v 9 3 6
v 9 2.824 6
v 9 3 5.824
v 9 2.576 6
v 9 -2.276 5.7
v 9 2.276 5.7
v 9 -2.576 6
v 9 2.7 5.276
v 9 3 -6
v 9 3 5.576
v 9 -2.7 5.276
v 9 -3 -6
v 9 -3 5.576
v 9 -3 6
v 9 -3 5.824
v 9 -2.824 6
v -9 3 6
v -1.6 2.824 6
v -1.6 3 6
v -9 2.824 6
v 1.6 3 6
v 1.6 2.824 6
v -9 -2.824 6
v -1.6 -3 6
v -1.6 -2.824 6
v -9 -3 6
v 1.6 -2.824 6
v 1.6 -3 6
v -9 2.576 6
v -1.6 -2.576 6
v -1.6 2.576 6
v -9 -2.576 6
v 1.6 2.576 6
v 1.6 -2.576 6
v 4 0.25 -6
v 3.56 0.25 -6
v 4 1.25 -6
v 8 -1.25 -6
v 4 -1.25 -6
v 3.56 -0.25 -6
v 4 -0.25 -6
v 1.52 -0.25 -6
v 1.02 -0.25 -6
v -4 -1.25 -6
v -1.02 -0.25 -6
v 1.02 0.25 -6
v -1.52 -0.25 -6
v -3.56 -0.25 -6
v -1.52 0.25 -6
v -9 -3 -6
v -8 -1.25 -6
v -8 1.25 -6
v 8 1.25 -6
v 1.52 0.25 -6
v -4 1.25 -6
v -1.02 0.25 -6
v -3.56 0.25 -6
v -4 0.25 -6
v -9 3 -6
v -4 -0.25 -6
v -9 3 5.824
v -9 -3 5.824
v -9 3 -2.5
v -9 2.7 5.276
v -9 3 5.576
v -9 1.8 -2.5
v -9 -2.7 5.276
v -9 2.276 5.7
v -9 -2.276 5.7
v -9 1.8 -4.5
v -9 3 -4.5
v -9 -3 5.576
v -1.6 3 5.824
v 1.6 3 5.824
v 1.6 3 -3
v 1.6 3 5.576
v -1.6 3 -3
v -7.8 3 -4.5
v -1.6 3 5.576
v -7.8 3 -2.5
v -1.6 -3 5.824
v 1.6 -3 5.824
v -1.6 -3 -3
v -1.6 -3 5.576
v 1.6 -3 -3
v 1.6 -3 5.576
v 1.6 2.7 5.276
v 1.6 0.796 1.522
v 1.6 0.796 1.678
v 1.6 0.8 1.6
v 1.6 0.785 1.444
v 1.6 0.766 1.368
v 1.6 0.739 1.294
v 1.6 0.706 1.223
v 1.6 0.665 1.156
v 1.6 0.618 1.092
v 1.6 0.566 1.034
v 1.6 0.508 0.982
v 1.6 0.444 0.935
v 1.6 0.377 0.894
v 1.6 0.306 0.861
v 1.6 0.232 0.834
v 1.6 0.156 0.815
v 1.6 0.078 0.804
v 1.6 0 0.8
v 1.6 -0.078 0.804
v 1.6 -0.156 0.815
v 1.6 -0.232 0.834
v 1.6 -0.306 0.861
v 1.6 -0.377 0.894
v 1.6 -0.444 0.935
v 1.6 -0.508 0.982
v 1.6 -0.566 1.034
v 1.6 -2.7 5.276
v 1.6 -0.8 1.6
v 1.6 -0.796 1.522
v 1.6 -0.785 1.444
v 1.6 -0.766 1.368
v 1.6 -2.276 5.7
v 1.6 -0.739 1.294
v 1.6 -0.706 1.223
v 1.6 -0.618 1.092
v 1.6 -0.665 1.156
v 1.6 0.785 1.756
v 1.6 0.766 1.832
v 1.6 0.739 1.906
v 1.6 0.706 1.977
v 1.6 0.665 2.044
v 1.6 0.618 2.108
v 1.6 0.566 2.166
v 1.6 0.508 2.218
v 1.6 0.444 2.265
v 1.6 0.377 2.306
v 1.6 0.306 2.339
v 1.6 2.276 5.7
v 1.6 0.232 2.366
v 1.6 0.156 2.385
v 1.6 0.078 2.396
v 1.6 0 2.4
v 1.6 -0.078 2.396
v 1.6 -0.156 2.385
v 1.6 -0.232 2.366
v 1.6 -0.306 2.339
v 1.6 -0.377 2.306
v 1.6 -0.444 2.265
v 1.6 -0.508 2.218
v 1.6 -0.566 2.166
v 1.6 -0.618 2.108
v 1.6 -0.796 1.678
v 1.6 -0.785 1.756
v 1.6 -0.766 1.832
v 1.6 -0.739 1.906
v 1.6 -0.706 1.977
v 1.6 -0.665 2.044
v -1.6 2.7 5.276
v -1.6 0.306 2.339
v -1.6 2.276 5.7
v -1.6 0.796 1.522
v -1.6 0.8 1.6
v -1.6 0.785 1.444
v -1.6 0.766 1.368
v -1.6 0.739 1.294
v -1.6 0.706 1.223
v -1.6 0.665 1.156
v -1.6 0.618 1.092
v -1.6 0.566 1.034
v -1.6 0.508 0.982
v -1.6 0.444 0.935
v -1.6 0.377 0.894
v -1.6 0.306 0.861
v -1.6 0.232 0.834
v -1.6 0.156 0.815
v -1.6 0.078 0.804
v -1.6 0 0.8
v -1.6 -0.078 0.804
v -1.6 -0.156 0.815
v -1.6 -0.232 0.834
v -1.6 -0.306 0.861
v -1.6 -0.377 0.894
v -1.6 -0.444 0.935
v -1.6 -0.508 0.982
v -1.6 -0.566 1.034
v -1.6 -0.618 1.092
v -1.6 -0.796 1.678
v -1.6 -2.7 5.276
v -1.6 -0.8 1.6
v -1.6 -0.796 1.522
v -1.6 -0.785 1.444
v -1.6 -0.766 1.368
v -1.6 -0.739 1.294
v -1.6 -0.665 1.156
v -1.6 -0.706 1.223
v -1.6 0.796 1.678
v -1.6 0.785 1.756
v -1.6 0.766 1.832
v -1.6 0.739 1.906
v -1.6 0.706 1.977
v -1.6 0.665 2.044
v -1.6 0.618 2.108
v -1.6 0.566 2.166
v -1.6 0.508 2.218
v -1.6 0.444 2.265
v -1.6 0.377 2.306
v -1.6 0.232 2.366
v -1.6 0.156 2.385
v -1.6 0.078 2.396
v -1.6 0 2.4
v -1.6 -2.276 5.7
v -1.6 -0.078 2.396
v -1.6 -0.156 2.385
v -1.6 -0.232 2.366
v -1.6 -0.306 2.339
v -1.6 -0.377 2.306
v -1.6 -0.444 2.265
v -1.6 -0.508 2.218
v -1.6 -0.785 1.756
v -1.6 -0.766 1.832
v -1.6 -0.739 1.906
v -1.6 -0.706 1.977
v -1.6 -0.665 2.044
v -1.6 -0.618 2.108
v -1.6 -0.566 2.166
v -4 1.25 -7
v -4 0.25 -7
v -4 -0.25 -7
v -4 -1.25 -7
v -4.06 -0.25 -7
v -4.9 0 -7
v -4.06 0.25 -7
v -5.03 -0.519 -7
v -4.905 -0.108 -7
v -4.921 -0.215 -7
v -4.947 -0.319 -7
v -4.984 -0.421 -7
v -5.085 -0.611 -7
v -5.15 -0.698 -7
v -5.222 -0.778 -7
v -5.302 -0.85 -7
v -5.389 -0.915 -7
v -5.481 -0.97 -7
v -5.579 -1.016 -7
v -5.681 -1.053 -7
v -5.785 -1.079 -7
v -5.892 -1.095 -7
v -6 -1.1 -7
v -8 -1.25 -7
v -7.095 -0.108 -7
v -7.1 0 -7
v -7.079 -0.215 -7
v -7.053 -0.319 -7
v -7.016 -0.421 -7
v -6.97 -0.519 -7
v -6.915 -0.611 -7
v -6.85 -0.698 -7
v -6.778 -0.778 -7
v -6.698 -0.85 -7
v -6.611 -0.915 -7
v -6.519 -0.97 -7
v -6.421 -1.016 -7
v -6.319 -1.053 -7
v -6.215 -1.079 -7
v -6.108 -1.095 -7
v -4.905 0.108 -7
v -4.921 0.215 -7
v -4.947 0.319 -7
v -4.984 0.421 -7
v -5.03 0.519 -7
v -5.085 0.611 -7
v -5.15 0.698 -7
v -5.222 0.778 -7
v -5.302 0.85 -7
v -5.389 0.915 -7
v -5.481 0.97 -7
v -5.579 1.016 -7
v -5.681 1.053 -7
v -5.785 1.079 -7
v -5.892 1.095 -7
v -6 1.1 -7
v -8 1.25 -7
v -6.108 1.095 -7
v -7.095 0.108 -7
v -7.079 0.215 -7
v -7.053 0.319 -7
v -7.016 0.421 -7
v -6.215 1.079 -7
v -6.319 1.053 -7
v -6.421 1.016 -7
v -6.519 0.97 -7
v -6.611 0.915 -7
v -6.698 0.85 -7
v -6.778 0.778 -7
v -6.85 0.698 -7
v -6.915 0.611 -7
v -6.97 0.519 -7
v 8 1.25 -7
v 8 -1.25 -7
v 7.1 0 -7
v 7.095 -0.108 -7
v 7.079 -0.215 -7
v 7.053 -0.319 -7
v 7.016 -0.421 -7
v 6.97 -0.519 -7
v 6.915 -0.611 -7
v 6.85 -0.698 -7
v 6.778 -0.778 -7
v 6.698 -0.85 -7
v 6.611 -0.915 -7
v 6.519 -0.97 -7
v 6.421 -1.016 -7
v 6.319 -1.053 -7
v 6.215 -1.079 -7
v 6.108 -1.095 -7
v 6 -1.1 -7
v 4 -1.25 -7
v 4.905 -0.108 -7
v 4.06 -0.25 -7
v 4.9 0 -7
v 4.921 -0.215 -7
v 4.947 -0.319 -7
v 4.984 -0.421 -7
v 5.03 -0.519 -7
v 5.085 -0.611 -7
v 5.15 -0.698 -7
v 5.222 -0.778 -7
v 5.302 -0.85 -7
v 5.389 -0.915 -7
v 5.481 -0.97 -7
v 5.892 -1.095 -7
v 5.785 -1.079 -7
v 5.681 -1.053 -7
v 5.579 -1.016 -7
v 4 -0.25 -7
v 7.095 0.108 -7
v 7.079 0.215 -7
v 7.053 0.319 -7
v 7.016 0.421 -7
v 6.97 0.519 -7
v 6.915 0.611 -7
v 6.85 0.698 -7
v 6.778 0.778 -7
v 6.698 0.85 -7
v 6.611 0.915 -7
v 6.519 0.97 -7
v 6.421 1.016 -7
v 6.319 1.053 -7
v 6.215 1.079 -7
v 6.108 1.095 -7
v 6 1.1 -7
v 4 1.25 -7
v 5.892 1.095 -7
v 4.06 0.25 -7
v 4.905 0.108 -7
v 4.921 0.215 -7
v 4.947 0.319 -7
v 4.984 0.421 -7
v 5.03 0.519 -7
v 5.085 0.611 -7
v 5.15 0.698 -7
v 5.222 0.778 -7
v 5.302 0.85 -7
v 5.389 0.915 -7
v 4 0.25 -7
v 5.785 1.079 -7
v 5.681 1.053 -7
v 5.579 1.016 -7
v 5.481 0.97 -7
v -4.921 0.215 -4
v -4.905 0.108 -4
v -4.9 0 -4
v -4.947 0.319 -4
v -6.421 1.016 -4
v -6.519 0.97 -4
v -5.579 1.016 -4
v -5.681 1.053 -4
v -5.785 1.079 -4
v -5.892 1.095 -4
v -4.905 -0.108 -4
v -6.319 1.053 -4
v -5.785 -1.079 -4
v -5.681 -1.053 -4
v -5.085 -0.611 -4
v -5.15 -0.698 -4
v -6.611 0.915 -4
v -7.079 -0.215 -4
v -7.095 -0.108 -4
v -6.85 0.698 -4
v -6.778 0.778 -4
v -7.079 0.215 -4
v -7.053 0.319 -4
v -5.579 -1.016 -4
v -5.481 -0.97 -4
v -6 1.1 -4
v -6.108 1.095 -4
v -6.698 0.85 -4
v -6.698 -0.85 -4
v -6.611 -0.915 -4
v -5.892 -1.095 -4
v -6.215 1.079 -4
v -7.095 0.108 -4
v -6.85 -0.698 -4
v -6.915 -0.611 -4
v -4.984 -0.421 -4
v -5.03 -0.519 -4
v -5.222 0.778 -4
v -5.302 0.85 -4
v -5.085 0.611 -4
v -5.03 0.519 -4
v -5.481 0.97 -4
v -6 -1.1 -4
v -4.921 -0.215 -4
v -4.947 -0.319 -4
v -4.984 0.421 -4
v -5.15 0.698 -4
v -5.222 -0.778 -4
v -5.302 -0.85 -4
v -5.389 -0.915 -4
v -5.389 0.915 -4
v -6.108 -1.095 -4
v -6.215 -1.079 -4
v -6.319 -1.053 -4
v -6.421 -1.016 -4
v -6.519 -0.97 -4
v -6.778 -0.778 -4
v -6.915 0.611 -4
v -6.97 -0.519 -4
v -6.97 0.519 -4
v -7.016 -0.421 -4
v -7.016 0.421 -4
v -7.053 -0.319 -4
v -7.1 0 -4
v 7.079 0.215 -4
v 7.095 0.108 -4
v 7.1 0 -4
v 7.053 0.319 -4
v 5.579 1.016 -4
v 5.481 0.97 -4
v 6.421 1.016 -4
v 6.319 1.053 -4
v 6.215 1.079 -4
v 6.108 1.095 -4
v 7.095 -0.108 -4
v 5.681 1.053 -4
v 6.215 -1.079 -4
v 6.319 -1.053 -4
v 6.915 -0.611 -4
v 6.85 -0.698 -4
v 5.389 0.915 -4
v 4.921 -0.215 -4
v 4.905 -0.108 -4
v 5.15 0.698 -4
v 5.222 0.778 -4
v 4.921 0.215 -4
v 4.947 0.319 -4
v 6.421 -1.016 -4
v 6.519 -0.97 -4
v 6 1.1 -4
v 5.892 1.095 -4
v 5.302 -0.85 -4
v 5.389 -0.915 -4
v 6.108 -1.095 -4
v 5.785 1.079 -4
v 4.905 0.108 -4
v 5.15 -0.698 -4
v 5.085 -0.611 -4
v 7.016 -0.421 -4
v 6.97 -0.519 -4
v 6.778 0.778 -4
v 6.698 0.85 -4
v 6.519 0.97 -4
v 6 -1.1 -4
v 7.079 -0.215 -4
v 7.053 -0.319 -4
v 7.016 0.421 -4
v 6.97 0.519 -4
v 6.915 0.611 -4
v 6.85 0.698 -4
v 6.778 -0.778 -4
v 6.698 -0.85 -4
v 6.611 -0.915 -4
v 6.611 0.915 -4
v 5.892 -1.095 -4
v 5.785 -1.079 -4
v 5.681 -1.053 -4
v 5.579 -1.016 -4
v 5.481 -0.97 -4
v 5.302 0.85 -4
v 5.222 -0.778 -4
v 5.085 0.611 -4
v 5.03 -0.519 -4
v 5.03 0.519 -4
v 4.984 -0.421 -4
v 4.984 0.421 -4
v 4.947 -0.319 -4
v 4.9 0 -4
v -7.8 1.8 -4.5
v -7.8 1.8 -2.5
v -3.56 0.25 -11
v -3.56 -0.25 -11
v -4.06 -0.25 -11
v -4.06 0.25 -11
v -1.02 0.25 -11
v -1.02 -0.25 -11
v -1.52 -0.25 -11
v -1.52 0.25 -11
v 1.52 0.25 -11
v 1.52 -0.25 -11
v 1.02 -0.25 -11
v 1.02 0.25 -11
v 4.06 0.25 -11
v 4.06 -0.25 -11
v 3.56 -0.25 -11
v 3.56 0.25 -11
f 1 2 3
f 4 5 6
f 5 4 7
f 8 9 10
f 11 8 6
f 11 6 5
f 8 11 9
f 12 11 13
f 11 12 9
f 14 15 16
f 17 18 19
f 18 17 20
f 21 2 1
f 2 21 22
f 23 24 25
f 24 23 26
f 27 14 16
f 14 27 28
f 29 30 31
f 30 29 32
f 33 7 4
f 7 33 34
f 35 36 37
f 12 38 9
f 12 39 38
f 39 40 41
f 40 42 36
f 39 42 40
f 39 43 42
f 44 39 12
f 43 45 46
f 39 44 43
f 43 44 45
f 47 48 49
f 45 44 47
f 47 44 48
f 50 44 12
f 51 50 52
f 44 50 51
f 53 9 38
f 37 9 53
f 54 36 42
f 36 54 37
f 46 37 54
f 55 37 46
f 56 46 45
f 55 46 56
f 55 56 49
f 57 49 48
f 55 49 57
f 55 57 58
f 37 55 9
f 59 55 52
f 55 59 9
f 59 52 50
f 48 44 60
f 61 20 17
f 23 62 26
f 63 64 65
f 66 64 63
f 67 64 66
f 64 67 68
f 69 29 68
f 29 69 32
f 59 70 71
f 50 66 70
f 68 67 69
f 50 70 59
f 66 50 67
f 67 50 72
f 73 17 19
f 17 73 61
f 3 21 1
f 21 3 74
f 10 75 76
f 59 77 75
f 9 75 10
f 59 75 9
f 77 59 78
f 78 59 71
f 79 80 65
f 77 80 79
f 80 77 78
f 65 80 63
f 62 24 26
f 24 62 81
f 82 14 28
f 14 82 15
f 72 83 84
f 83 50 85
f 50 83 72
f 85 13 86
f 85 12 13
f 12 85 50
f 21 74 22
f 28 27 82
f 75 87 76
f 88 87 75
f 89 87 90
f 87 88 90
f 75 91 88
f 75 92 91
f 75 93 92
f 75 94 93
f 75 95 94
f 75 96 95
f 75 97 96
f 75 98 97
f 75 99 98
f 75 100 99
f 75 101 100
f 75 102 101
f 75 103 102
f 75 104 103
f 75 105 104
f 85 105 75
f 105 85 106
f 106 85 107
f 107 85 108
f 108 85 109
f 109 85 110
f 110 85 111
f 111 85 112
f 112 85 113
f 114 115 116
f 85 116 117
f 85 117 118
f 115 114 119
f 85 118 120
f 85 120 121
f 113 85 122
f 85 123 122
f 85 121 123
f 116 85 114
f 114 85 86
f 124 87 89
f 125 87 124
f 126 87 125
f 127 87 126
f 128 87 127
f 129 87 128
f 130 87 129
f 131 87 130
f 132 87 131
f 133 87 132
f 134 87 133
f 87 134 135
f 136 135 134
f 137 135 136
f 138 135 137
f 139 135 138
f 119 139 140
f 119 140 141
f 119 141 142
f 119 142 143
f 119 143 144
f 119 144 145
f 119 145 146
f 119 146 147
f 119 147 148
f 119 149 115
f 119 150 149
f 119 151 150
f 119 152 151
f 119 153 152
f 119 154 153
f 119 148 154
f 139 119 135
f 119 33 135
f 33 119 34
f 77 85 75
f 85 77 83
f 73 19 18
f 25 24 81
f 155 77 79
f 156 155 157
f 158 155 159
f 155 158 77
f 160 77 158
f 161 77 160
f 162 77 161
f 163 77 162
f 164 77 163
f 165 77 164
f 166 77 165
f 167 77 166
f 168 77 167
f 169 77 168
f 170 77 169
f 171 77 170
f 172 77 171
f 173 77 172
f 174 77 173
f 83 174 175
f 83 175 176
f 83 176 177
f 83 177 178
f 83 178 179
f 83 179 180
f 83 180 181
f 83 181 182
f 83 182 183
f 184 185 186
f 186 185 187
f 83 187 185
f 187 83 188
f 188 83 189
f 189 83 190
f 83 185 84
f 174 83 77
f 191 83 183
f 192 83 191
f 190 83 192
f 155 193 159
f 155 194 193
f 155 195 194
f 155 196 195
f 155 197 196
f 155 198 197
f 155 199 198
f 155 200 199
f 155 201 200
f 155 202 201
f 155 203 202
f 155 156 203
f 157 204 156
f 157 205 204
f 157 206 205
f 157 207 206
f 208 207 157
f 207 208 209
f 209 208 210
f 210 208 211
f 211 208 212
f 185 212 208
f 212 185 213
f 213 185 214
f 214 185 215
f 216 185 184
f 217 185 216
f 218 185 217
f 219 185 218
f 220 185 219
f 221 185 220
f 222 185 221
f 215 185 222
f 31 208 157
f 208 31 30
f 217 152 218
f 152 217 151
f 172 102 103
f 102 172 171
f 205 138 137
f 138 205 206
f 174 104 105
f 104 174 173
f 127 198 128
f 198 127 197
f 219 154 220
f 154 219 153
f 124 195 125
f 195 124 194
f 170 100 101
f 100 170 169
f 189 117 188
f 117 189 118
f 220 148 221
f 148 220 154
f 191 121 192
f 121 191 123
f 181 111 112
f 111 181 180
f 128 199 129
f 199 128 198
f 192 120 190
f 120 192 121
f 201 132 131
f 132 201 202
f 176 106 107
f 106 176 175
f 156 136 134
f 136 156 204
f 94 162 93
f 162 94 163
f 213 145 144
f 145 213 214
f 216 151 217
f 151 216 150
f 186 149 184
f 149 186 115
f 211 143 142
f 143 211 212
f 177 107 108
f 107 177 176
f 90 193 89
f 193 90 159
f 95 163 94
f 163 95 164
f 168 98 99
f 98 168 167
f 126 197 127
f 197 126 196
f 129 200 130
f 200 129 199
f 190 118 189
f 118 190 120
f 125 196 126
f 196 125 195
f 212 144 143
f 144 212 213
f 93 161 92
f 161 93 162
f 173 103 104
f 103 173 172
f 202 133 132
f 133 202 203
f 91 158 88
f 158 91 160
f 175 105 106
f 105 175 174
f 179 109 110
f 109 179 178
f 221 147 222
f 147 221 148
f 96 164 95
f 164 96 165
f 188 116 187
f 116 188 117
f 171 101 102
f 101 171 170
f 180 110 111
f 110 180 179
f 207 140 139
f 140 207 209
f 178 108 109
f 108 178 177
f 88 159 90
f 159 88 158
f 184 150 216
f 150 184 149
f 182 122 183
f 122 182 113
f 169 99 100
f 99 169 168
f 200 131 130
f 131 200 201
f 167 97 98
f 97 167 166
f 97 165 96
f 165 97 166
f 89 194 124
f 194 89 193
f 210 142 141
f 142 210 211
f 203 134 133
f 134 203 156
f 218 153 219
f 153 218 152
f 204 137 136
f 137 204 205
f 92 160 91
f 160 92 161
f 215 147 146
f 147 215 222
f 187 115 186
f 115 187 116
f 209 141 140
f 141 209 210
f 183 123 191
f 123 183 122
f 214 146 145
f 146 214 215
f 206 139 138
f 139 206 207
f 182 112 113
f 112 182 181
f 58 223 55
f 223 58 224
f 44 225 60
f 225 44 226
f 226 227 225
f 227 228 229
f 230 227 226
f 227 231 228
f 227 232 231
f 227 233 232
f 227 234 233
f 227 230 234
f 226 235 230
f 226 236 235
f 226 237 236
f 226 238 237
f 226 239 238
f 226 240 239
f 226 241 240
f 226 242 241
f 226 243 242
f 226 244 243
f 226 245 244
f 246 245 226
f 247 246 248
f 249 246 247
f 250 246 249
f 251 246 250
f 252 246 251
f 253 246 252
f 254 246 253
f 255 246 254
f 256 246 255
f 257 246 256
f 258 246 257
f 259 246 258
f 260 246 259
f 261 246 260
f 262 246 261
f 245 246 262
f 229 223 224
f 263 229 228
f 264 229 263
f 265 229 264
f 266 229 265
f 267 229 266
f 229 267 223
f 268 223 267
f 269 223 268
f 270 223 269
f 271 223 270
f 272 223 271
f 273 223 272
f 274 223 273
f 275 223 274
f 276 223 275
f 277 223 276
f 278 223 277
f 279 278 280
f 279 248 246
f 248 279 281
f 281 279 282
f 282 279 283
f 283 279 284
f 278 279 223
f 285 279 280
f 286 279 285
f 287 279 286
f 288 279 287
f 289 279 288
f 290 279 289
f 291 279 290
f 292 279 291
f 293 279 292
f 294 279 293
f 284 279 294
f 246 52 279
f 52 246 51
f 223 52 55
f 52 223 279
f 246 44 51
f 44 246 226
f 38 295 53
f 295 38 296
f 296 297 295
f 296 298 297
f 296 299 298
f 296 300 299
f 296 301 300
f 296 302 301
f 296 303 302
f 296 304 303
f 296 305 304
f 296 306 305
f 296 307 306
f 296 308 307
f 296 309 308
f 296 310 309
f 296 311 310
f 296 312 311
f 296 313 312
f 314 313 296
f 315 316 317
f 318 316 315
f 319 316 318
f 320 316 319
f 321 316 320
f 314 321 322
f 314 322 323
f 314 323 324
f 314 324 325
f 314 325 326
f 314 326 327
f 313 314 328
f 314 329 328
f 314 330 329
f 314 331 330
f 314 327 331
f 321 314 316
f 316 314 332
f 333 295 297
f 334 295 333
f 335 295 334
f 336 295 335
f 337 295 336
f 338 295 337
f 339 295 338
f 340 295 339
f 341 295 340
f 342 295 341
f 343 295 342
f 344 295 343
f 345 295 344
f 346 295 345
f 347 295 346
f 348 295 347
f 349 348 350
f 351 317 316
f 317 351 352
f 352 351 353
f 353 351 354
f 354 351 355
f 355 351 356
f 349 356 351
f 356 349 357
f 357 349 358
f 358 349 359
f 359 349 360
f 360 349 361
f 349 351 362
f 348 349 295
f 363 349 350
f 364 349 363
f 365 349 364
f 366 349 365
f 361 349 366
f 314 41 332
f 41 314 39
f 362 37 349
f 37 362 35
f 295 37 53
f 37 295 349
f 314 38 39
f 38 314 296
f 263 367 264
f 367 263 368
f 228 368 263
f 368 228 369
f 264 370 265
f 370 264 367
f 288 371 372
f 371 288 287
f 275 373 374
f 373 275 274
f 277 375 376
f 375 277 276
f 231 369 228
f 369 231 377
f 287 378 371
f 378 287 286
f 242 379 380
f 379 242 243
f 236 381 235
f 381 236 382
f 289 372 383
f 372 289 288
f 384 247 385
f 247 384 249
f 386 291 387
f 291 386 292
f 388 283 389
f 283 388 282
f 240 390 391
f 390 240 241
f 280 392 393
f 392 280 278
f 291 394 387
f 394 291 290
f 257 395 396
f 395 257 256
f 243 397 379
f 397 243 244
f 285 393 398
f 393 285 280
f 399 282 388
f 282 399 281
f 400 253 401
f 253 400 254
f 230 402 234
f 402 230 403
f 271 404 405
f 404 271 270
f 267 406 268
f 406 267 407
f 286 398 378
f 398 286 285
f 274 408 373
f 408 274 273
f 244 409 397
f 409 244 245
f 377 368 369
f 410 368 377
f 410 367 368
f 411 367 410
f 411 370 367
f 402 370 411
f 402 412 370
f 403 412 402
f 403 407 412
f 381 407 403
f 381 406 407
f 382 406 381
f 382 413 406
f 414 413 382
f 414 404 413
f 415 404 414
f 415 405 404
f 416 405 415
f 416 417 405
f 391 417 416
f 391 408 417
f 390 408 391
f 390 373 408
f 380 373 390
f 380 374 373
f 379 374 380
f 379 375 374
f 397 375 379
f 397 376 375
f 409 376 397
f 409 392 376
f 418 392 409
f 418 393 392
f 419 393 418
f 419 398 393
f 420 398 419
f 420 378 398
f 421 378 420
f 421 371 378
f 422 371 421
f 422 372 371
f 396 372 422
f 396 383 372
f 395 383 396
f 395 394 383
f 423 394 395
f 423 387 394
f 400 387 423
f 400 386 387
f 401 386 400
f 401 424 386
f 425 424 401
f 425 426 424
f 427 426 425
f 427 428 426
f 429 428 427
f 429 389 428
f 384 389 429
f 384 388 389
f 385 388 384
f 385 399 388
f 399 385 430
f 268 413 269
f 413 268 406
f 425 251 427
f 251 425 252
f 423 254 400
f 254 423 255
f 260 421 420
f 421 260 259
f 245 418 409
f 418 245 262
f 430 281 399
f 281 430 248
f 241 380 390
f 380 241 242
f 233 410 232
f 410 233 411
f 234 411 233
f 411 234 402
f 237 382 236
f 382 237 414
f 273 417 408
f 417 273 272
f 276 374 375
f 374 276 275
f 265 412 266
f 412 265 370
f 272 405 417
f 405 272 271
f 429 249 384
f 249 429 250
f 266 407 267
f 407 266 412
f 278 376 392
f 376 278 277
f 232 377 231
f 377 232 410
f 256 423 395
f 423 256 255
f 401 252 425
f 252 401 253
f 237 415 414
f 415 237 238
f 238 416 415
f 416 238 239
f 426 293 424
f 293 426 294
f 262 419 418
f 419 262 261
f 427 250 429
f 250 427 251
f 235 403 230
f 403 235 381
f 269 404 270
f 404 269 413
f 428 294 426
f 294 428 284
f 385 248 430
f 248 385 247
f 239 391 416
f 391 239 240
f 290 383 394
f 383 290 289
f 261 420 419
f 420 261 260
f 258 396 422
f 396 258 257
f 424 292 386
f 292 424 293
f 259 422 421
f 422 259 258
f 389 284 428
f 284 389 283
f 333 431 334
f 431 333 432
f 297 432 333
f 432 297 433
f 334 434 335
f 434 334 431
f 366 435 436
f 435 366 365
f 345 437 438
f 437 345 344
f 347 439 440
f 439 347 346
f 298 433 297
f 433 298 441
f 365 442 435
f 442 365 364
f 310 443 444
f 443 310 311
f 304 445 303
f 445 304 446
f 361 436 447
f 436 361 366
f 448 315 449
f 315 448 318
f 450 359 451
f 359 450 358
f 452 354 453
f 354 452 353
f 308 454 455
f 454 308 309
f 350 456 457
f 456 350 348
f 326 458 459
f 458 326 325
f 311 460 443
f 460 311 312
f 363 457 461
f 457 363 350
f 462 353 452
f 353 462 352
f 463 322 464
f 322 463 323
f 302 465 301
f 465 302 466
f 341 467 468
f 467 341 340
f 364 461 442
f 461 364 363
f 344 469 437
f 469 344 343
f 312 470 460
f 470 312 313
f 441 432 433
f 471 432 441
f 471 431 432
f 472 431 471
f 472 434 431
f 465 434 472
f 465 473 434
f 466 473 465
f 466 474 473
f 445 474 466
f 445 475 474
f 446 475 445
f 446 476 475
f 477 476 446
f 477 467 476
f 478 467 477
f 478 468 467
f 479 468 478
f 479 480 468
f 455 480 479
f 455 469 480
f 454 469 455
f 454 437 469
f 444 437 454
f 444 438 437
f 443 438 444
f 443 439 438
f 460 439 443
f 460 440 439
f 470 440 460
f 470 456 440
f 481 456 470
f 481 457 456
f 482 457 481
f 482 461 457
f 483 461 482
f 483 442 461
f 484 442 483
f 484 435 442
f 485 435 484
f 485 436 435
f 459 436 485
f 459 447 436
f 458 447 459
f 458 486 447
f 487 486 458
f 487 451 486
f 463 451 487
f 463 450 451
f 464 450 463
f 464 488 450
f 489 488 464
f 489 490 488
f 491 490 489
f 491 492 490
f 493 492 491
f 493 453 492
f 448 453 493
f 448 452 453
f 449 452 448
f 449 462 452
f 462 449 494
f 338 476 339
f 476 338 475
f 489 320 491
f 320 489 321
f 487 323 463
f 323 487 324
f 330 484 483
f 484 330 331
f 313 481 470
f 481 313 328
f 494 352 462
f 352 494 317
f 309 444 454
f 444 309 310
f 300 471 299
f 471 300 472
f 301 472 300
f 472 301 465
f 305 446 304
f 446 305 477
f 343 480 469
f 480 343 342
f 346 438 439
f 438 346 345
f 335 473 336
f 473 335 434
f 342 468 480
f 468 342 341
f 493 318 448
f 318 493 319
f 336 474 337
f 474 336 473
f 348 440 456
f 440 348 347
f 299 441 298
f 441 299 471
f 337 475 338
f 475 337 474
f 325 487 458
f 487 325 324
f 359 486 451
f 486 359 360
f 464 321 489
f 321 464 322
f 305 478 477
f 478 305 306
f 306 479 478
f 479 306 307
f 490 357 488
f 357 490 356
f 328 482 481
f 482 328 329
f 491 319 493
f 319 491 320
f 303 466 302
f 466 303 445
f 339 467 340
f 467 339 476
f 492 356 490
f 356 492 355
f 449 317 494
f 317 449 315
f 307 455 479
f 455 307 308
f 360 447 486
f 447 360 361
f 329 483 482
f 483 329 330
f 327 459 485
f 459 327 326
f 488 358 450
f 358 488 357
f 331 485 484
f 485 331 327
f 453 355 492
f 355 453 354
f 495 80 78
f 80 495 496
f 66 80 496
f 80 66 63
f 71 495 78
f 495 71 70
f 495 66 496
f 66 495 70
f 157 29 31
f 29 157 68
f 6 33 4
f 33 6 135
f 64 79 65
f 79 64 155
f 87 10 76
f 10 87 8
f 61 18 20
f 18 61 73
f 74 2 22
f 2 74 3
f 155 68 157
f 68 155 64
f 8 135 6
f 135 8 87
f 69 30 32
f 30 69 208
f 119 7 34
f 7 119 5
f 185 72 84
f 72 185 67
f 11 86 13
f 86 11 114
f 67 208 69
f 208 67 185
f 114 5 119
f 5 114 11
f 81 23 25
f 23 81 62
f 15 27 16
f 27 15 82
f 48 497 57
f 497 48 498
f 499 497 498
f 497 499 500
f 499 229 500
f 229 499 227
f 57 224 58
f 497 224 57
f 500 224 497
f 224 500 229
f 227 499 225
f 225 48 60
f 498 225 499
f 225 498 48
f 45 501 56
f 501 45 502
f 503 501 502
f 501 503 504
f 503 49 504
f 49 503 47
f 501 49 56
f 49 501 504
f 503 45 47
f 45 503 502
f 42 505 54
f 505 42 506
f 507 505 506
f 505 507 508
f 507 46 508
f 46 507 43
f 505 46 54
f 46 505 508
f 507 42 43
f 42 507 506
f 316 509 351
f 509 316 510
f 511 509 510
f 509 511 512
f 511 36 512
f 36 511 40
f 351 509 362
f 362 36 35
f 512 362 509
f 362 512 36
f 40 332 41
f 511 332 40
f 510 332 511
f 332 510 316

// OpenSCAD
// Photo interrupter (U-slot) - fixed: visible U-shaped fork/slot, connected geometry, no floating parts

$fn = 64;

// Parameters
body_L = 18; //[9:36:1]   // X
body_W = 6;  //[3:12:1]   // Y
body_H = 12; //[6:24:1]   // Z
wall_t = 1.5; //[0.8:3:0.1]

slot_W = 3.2; //[1.6:6.4:0.1]          // slot opening width (X)
slot_depth = 8; //[4:16:1]              // slot depth from TOP (Z)

pin_count = 4; //[2:8:1]
pin_pitch = 2.54; //[1.27:5.08:0.01]
pin_W = 0.5; //[0.25:1:0.05]
pin_D = 0.5; //[0.25:1:0.05]
pin_L = 5; //[2.5:10:0.5]
pin_standoff = 1; //[0.5:2:0.1]

ear_L = 4; //[2:8:0.5]
ear_W = 2.5; //[1.2:5:0.1]
ear_t = 2; //[1:4:0.1]
mount_hole_d = 2.2; //[1.1:4.4:0.1]
mount_hole_spacing = 12; //[6:24:1]

overlap = 1; //[0.5:2:0.1]
chamfer_size = 0.6; //[0.3:1.2:0.1]

key_notch_W = 1.2; //[0.6:2.4:0.1]
key_notch_D = 1.2; //[0.6:2.4:0.1]
key_notch_H = 2; //[1:4:0.1]

lens_r = 0.8; //[0.4:1.6:0.1]
lens_depth = 0.6; //[0.3:1.2:0.1]

pin_tip_taper_L = 1.2; //[0.6:2.4:0.1]

// Derived / safety clamps
slot_W_eff = min(slot_W, body_L - 2*wall_t - 0.2);
slot_depth_eff = min(slot_depth, body_H - wall_t - 0.2);

// Ensure there is material on both sides of the slot (fork arms)
arm_min = 1.2;
arm_W = max((body_L - slot_W_eff)/2, arm_min);
slot_W_eff2 = min(slot_W_eff, body_L - 2*arm_min);

// Recompute with enforced arms
arm_W2 = (body_L - slot_W_eff2)/2;

// Helpers
module chamfer_cut_x() {
  cube([body_L + 2*overlap, chamfer_size, chamfer_size], center=true);
}

module mount_hole_cut() {
  cylinder(r=mount_hole_d/2, h=ear_t + 2*overlap, center=true);
}

module lead_pin() {
  cube([pin_W, pin_D, pin_L + pin_standoff], center=true);
}

module pin_tip_taper() {
  cylinder(h=pin_tip_taper_L, r1=pin_W/2, r2=0, center=true);
}

module internal_lens() {
  rotate([0, 90, 0])
    cylinder(r=lens_r, h=lens_depth + 2*overlap, center=true);
}

module keying_notch_cut() {
  cube([key_notch_W, key_notch_D, key_notch_H], center=true);
}

// Main housing with a real U-slot (open from TOP down)
module u_shaped_housing() {
  difference() {
    // Outer body
    cube([body_L, body_W, body_H], center=true);

    // Slot cut: spans full Y (slightly beyond), starts at TOP and goes down slot_depth
    // Center Z = top - slot_depth/2
    translate([0, 0, body_H/2 - slot_depth_eff/2])
      cube([slot_W_eff2, body_W + 2*overlap, slot_depth_eff + 2*overlap], center=true);
  }
}

// Add small "lens" bumps on inner faces of the fork arms (inside the slot)
module lenses() {
  // Place within the slot region, on inner faces of arms
  lens_z = body_H/2 - slot_depth_eff*0.55; // inside the slot depth
  lens_x_left  = -slot_W_eff2/2 - lens_depth/2 + overlap; // protrude from left inner face into slot
  lens_x_right =  slot_W_eff2/2 + lens_depth/2 - overlap; // protrude from right inner face into slot

  translate([lens_x_left, 0, lens_z])  internal_lens();
  translate([lens_x_right, 0, lens_z]) internal_lens();
}

// Mounting ears attached to bottom (overlap into body for connectivity)
module mounting_ears() {
  ear_z = -body_H/2 + ear_t/2 - overlap;

  translate([-mount_hole_spacing/2, 0, ear_z])
    cube([ear_L, ear_W, ear_t], center=true);

  translate([ mount_hole_spacing/2, 0, ear_z])
    cube([ear_L, ear_W, ear_t], center=true);
}

// Housing with holes, notch, chamfers
module housing_detail() {
  difference() {
    // Start with connected union
    union() {
      u_shaped_housing();
      lenses();
      mounting_ears();
    }

    // Mount holes through ears
    ear_z = -body_H/2 + ear_t/2 - overlap;
    translate([-mount_hole_spacing/2, 0, ear_z]) mount_hole_cut();
    translate([ mount_hole_spacing/2, 0, ear_z]) mount_hole_cut();

    // Keying notch on one bottom-front corner (kept small; does not disconnect)
    translate([
      -body_L/2 + key_notch_W/2,
       body_W/2 - key_notch_D/2,
      -body_H/2 + wall_t + key_notch_H/2
    ])
      keying_notch_cut();

    // Top edge chamfers (front/back)
    translate([0,  body_W/2 - chamfer_size/2, body_H/2 - chamfer_size/2])
      rotate([45, 0, 0]) chamfer_cut_x();

    translate([0, -body_W/2 + chamfer_size/2, body_H/2 - chamfer_size/2])
      rotate([-45, 0, 0]) chamfer_cut_x();
  }
}

// Pins: overlap into body so the final model is ONE connected solid
module lead_pins() {
  union() {
    pin_total = pin_L + pin_standoff;

    // Put pin top slightly inside the body bottom for guaranteed connection
    // Pin center Z = bottom - pin_total/2 + overlap
    pin_z = -body_H/2 - pin_total/2 + overlap;

    for (i = [0:pin_count-1]) {
      x = (i - (pin_count-1)/2) * pin_pitch;

      translate([x, 0, pin_z]) lead_pin();

      // Taper at very bottom
      tip_z = (-body_H/2 - pin_total + pin_tip_taper_L/2) + overlap;
      translate([x, 0, tip_z]) pin_tip_taper();
    }
  }
}

// Final (ONE connected solid)
union() {
  housing_detail();
  lead_pins();
}
